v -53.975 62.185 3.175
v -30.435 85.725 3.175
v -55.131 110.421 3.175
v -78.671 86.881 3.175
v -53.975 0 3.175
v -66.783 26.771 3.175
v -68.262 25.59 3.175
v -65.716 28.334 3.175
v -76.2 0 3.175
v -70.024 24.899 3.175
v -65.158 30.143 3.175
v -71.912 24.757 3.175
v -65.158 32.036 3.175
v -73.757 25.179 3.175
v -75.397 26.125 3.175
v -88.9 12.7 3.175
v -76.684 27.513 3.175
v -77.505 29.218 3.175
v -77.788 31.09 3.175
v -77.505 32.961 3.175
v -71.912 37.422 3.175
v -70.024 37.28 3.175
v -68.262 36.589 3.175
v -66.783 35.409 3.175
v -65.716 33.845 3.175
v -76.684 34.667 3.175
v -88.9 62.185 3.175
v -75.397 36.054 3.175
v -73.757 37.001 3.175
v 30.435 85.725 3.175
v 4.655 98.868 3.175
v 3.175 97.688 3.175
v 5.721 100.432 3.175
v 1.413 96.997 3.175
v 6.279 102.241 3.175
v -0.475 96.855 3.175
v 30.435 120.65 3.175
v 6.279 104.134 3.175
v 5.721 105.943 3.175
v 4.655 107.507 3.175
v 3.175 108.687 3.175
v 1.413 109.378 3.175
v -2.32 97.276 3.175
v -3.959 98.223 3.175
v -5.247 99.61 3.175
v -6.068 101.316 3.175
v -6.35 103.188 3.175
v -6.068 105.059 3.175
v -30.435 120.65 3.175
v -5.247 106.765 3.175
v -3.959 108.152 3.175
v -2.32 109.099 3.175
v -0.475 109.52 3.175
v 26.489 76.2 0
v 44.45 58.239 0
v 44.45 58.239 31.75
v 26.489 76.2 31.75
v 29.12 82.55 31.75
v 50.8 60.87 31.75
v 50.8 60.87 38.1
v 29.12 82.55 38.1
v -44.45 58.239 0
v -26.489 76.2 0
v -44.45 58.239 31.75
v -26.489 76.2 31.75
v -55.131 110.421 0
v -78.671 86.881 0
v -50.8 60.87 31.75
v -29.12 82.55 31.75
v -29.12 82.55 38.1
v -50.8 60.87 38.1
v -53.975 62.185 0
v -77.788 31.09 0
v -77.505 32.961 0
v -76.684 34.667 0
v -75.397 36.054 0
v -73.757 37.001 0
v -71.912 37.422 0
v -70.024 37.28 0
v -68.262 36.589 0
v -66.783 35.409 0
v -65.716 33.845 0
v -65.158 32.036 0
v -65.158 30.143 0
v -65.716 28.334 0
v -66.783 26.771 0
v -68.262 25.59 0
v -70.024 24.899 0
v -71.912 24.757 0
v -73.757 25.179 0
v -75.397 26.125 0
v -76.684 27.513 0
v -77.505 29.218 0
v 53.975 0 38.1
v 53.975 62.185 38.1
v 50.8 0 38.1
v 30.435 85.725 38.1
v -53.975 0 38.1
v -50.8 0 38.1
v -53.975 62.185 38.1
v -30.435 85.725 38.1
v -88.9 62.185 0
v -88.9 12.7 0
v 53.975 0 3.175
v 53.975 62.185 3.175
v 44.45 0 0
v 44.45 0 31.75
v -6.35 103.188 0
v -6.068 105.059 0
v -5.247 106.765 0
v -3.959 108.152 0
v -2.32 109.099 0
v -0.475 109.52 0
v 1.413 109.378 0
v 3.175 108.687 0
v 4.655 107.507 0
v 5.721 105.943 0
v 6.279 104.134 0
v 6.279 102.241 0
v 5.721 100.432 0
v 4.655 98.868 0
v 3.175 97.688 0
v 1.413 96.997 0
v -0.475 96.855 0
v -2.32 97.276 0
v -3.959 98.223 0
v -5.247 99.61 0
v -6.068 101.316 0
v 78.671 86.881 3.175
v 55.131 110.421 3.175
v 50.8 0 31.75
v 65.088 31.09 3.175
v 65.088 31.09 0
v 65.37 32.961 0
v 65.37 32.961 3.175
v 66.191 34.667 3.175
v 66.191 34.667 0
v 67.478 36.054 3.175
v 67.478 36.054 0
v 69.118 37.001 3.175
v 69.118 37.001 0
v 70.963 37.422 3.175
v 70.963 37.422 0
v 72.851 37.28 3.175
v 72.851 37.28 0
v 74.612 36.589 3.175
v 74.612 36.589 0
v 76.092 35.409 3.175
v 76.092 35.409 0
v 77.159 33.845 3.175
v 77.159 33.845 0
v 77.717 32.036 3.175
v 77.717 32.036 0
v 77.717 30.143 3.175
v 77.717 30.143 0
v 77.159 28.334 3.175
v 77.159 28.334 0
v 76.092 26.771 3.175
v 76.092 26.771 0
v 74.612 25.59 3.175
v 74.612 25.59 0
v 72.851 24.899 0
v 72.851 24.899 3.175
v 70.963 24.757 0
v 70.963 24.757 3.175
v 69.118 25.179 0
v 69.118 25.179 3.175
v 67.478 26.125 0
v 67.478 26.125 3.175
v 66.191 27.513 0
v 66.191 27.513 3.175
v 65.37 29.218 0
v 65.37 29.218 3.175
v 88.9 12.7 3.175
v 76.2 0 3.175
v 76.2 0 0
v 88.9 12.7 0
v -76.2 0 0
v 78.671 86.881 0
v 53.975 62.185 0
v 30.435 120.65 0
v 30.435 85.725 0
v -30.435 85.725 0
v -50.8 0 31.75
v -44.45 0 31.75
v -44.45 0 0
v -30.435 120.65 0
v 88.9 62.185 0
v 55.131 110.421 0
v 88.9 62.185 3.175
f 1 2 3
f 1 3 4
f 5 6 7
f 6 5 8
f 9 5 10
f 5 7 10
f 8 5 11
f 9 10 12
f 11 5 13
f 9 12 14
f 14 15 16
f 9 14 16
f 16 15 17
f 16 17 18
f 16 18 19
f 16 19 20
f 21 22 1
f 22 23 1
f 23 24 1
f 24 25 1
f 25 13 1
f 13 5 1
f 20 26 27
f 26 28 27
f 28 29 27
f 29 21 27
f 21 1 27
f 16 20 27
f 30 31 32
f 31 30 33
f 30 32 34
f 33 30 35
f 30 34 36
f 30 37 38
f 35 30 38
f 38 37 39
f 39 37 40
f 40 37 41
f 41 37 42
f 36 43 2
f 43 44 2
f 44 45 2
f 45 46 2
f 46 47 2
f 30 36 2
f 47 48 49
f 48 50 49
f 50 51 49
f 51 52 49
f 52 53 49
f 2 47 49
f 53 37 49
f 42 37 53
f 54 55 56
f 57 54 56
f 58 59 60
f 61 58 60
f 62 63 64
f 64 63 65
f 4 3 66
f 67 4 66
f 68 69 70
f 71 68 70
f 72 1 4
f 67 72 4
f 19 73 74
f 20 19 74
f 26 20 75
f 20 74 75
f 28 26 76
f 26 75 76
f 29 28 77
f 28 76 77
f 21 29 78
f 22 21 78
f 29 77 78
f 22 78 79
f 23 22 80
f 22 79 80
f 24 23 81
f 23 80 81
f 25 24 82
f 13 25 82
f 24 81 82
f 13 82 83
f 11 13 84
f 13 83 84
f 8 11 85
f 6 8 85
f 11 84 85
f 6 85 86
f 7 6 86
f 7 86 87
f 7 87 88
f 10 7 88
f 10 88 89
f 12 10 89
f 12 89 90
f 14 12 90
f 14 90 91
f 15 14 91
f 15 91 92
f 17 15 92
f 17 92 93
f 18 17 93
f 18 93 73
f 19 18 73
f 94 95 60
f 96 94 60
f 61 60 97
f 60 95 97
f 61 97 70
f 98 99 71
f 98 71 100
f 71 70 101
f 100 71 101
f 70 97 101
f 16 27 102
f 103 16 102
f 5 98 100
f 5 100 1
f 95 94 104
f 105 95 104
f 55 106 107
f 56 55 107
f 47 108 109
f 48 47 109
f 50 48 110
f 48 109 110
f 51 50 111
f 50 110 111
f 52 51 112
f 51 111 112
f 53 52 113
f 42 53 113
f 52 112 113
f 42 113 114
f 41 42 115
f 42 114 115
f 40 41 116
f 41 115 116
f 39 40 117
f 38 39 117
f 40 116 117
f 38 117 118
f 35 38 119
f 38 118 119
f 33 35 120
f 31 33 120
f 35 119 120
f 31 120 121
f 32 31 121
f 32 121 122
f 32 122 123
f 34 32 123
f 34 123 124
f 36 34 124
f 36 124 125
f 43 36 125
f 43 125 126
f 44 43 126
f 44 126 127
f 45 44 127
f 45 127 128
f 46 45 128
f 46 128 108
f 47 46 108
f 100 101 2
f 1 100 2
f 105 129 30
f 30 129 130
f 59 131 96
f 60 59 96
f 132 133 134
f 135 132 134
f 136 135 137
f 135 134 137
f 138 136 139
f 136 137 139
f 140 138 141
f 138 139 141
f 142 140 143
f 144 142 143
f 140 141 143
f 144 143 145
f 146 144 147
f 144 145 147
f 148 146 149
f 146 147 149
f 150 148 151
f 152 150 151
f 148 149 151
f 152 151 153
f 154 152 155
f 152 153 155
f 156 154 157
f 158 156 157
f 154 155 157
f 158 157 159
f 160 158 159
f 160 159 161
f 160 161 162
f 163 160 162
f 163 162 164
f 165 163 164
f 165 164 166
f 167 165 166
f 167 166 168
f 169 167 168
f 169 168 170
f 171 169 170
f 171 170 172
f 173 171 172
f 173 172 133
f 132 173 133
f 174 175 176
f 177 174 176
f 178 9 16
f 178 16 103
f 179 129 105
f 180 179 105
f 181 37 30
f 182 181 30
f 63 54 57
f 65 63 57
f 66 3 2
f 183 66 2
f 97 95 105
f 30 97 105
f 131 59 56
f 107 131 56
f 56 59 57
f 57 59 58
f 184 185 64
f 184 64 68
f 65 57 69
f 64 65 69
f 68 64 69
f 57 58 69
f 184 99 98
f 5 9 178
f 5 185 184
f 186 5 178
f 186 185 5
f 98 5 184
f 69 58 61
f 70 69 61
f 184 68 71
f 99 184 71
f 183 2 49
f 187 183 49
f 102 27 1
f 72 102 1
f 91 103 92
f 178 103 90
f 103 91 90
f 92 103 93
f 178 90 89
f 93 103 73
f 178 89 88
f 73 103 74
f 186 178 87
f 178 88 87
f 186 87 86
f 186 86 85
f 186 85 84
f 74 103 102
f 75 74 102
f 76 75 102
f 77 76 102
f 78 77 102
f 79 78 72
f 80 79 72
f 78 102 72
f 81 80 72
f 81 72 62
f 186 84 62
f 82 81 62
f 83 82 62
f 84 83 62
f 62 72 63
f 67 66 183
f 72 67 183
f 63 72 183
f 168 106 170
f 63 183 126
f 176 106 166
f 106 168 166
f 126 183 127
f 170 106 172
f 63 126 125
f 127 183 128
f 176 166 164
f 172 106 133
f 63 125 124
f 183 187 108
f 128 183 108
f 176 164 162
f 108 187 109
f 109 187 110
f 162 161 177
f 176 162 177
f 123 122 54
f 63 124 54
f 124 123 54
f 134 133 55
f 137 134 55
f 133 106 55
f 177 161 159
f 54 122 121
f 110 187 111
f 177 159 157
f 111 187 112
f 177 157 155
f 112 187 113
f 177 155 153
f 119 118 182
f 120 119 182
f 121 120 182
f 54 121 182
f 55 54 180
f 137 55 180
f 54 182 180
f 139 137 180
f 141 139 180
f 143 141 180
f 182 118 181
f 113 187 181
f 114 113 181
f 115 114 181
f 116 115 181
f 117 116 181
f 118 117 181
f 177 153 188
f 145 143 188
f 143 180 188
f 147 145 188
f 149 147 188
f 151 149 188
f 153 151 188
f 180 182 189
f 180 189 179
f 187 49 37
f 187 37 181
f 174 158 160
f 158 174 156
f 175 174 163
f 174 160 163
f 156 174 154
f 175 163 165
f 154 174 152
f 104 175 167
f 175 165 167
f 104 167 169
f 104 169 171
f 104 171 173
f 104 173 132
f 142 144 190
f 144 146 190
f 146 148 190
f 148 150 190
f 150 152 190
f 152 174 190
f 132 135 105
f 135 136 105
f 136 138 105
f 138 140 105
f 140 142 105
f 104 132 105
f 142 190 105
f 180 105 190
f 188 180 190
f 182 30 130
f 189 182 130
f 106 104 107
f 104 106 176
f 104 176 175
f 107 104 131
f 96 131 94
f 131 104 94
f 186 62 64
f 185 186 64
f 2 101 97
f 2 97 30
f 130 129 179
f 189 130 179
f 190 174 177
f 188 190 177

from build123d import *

# Parameters (mm, degrees)
F4_D     = 12.7
F4_DEPTH = 12.7
F4_TIP   = 3.8154649308
F6_DEPTH = 3.176
F7_SIZE  = 12.7


# Not quite as in the source:
# - a feature names something its author has since deleted; it is built from what else it names


with BuildPart() as f2:
    # F2: sweep along a path in F1
    with BuildLine(Plane.XY) as f2_path:
        Line((-44.45, 0), (-44.45, 58.2394877579))
        Line((-44.45, 58.2394877579), (-26.4894877579, 76.2))
        Line((-26.4894877579, 76.2), (26.4894877579, 76.2))
        Line((26.4894877579, 76.2), (44.45, 58.2394877579))
        Line((44.45, 58.2394877579), (44.45, 0))
    # F0 (on Front) → F2 (sweep)
    with BuildSketch(Plane.XZ):
        Polygon((-50.8, 38.1), (-53.975, 38.1), (-53.975, 3.175), (-88.9, 3.175), (-88.9, 0), (-53.975, 0), (-50.8, 0), (-50.8, 3.175), (-50.8, 31.75), align=None)
        Polygon((-44.45, 31.75), (-50.8, 31.75), (-50.8, 3.175), (-50.8, 0), (-44.45, 0), align=None)
    sweep(path=f2_path.line, transition=Transition.RIGHT)

    # F4
    with Locations(Plane.XY.offset(3.175)):
        with Locations((-71.4375, 31.0896), (71.4375, 31.0896), (0, 103.1875)):
            Hole(F4_D / 2, depth=F4_DEPTH)
            with Locations((0, 0, -(F4_DEPTH + F4_TIP / 2))):  # 118° drill point
                Cone(0, F4_D / 2, F4_TIP, mode=Mode.SUBTRACT)

    # F5 (on face) → F6 (cut, through all)
    with BuildSketch(Plane.XY.offset(3.175)):
        Polygon((-88.9, 62.1848719395), (-53.975, 62.1848719395), (-78.6707043329, 86.8805762724), (-88.9, 76.6512806053), align=None)
        Polygon((-55.1305762724, 110.4207043329), (-30.4348719395, 85.725), (-30.4348719395, 120.65), (-44.9012806053, 120.65), align=None)
        Polygon((30.4348719395, 120.65), (30.4348719395, 85.725), (55.1305762724, 110.4207043329), (44.9012806053, 120.65), align=None)
        Polygon((78.6707043329, 86.8805762724), (53.975, 62.1848719395), (88.9, 62.1848719395), (88.9, 76.6512806053), align=None)
    extrude(amount=-F6_DEPTH, mode=Mode.SUBTRACT)

    # F7
    f7_edges = [f2.edges().sort_by_distance(p)[0] for p in [
        (-88.9, 0, 1.5875),
        (88.9, 0, 1.5875),
    ]]
    chamfer(f7_edges, length=F7_SIZE)


solid = f2.part
